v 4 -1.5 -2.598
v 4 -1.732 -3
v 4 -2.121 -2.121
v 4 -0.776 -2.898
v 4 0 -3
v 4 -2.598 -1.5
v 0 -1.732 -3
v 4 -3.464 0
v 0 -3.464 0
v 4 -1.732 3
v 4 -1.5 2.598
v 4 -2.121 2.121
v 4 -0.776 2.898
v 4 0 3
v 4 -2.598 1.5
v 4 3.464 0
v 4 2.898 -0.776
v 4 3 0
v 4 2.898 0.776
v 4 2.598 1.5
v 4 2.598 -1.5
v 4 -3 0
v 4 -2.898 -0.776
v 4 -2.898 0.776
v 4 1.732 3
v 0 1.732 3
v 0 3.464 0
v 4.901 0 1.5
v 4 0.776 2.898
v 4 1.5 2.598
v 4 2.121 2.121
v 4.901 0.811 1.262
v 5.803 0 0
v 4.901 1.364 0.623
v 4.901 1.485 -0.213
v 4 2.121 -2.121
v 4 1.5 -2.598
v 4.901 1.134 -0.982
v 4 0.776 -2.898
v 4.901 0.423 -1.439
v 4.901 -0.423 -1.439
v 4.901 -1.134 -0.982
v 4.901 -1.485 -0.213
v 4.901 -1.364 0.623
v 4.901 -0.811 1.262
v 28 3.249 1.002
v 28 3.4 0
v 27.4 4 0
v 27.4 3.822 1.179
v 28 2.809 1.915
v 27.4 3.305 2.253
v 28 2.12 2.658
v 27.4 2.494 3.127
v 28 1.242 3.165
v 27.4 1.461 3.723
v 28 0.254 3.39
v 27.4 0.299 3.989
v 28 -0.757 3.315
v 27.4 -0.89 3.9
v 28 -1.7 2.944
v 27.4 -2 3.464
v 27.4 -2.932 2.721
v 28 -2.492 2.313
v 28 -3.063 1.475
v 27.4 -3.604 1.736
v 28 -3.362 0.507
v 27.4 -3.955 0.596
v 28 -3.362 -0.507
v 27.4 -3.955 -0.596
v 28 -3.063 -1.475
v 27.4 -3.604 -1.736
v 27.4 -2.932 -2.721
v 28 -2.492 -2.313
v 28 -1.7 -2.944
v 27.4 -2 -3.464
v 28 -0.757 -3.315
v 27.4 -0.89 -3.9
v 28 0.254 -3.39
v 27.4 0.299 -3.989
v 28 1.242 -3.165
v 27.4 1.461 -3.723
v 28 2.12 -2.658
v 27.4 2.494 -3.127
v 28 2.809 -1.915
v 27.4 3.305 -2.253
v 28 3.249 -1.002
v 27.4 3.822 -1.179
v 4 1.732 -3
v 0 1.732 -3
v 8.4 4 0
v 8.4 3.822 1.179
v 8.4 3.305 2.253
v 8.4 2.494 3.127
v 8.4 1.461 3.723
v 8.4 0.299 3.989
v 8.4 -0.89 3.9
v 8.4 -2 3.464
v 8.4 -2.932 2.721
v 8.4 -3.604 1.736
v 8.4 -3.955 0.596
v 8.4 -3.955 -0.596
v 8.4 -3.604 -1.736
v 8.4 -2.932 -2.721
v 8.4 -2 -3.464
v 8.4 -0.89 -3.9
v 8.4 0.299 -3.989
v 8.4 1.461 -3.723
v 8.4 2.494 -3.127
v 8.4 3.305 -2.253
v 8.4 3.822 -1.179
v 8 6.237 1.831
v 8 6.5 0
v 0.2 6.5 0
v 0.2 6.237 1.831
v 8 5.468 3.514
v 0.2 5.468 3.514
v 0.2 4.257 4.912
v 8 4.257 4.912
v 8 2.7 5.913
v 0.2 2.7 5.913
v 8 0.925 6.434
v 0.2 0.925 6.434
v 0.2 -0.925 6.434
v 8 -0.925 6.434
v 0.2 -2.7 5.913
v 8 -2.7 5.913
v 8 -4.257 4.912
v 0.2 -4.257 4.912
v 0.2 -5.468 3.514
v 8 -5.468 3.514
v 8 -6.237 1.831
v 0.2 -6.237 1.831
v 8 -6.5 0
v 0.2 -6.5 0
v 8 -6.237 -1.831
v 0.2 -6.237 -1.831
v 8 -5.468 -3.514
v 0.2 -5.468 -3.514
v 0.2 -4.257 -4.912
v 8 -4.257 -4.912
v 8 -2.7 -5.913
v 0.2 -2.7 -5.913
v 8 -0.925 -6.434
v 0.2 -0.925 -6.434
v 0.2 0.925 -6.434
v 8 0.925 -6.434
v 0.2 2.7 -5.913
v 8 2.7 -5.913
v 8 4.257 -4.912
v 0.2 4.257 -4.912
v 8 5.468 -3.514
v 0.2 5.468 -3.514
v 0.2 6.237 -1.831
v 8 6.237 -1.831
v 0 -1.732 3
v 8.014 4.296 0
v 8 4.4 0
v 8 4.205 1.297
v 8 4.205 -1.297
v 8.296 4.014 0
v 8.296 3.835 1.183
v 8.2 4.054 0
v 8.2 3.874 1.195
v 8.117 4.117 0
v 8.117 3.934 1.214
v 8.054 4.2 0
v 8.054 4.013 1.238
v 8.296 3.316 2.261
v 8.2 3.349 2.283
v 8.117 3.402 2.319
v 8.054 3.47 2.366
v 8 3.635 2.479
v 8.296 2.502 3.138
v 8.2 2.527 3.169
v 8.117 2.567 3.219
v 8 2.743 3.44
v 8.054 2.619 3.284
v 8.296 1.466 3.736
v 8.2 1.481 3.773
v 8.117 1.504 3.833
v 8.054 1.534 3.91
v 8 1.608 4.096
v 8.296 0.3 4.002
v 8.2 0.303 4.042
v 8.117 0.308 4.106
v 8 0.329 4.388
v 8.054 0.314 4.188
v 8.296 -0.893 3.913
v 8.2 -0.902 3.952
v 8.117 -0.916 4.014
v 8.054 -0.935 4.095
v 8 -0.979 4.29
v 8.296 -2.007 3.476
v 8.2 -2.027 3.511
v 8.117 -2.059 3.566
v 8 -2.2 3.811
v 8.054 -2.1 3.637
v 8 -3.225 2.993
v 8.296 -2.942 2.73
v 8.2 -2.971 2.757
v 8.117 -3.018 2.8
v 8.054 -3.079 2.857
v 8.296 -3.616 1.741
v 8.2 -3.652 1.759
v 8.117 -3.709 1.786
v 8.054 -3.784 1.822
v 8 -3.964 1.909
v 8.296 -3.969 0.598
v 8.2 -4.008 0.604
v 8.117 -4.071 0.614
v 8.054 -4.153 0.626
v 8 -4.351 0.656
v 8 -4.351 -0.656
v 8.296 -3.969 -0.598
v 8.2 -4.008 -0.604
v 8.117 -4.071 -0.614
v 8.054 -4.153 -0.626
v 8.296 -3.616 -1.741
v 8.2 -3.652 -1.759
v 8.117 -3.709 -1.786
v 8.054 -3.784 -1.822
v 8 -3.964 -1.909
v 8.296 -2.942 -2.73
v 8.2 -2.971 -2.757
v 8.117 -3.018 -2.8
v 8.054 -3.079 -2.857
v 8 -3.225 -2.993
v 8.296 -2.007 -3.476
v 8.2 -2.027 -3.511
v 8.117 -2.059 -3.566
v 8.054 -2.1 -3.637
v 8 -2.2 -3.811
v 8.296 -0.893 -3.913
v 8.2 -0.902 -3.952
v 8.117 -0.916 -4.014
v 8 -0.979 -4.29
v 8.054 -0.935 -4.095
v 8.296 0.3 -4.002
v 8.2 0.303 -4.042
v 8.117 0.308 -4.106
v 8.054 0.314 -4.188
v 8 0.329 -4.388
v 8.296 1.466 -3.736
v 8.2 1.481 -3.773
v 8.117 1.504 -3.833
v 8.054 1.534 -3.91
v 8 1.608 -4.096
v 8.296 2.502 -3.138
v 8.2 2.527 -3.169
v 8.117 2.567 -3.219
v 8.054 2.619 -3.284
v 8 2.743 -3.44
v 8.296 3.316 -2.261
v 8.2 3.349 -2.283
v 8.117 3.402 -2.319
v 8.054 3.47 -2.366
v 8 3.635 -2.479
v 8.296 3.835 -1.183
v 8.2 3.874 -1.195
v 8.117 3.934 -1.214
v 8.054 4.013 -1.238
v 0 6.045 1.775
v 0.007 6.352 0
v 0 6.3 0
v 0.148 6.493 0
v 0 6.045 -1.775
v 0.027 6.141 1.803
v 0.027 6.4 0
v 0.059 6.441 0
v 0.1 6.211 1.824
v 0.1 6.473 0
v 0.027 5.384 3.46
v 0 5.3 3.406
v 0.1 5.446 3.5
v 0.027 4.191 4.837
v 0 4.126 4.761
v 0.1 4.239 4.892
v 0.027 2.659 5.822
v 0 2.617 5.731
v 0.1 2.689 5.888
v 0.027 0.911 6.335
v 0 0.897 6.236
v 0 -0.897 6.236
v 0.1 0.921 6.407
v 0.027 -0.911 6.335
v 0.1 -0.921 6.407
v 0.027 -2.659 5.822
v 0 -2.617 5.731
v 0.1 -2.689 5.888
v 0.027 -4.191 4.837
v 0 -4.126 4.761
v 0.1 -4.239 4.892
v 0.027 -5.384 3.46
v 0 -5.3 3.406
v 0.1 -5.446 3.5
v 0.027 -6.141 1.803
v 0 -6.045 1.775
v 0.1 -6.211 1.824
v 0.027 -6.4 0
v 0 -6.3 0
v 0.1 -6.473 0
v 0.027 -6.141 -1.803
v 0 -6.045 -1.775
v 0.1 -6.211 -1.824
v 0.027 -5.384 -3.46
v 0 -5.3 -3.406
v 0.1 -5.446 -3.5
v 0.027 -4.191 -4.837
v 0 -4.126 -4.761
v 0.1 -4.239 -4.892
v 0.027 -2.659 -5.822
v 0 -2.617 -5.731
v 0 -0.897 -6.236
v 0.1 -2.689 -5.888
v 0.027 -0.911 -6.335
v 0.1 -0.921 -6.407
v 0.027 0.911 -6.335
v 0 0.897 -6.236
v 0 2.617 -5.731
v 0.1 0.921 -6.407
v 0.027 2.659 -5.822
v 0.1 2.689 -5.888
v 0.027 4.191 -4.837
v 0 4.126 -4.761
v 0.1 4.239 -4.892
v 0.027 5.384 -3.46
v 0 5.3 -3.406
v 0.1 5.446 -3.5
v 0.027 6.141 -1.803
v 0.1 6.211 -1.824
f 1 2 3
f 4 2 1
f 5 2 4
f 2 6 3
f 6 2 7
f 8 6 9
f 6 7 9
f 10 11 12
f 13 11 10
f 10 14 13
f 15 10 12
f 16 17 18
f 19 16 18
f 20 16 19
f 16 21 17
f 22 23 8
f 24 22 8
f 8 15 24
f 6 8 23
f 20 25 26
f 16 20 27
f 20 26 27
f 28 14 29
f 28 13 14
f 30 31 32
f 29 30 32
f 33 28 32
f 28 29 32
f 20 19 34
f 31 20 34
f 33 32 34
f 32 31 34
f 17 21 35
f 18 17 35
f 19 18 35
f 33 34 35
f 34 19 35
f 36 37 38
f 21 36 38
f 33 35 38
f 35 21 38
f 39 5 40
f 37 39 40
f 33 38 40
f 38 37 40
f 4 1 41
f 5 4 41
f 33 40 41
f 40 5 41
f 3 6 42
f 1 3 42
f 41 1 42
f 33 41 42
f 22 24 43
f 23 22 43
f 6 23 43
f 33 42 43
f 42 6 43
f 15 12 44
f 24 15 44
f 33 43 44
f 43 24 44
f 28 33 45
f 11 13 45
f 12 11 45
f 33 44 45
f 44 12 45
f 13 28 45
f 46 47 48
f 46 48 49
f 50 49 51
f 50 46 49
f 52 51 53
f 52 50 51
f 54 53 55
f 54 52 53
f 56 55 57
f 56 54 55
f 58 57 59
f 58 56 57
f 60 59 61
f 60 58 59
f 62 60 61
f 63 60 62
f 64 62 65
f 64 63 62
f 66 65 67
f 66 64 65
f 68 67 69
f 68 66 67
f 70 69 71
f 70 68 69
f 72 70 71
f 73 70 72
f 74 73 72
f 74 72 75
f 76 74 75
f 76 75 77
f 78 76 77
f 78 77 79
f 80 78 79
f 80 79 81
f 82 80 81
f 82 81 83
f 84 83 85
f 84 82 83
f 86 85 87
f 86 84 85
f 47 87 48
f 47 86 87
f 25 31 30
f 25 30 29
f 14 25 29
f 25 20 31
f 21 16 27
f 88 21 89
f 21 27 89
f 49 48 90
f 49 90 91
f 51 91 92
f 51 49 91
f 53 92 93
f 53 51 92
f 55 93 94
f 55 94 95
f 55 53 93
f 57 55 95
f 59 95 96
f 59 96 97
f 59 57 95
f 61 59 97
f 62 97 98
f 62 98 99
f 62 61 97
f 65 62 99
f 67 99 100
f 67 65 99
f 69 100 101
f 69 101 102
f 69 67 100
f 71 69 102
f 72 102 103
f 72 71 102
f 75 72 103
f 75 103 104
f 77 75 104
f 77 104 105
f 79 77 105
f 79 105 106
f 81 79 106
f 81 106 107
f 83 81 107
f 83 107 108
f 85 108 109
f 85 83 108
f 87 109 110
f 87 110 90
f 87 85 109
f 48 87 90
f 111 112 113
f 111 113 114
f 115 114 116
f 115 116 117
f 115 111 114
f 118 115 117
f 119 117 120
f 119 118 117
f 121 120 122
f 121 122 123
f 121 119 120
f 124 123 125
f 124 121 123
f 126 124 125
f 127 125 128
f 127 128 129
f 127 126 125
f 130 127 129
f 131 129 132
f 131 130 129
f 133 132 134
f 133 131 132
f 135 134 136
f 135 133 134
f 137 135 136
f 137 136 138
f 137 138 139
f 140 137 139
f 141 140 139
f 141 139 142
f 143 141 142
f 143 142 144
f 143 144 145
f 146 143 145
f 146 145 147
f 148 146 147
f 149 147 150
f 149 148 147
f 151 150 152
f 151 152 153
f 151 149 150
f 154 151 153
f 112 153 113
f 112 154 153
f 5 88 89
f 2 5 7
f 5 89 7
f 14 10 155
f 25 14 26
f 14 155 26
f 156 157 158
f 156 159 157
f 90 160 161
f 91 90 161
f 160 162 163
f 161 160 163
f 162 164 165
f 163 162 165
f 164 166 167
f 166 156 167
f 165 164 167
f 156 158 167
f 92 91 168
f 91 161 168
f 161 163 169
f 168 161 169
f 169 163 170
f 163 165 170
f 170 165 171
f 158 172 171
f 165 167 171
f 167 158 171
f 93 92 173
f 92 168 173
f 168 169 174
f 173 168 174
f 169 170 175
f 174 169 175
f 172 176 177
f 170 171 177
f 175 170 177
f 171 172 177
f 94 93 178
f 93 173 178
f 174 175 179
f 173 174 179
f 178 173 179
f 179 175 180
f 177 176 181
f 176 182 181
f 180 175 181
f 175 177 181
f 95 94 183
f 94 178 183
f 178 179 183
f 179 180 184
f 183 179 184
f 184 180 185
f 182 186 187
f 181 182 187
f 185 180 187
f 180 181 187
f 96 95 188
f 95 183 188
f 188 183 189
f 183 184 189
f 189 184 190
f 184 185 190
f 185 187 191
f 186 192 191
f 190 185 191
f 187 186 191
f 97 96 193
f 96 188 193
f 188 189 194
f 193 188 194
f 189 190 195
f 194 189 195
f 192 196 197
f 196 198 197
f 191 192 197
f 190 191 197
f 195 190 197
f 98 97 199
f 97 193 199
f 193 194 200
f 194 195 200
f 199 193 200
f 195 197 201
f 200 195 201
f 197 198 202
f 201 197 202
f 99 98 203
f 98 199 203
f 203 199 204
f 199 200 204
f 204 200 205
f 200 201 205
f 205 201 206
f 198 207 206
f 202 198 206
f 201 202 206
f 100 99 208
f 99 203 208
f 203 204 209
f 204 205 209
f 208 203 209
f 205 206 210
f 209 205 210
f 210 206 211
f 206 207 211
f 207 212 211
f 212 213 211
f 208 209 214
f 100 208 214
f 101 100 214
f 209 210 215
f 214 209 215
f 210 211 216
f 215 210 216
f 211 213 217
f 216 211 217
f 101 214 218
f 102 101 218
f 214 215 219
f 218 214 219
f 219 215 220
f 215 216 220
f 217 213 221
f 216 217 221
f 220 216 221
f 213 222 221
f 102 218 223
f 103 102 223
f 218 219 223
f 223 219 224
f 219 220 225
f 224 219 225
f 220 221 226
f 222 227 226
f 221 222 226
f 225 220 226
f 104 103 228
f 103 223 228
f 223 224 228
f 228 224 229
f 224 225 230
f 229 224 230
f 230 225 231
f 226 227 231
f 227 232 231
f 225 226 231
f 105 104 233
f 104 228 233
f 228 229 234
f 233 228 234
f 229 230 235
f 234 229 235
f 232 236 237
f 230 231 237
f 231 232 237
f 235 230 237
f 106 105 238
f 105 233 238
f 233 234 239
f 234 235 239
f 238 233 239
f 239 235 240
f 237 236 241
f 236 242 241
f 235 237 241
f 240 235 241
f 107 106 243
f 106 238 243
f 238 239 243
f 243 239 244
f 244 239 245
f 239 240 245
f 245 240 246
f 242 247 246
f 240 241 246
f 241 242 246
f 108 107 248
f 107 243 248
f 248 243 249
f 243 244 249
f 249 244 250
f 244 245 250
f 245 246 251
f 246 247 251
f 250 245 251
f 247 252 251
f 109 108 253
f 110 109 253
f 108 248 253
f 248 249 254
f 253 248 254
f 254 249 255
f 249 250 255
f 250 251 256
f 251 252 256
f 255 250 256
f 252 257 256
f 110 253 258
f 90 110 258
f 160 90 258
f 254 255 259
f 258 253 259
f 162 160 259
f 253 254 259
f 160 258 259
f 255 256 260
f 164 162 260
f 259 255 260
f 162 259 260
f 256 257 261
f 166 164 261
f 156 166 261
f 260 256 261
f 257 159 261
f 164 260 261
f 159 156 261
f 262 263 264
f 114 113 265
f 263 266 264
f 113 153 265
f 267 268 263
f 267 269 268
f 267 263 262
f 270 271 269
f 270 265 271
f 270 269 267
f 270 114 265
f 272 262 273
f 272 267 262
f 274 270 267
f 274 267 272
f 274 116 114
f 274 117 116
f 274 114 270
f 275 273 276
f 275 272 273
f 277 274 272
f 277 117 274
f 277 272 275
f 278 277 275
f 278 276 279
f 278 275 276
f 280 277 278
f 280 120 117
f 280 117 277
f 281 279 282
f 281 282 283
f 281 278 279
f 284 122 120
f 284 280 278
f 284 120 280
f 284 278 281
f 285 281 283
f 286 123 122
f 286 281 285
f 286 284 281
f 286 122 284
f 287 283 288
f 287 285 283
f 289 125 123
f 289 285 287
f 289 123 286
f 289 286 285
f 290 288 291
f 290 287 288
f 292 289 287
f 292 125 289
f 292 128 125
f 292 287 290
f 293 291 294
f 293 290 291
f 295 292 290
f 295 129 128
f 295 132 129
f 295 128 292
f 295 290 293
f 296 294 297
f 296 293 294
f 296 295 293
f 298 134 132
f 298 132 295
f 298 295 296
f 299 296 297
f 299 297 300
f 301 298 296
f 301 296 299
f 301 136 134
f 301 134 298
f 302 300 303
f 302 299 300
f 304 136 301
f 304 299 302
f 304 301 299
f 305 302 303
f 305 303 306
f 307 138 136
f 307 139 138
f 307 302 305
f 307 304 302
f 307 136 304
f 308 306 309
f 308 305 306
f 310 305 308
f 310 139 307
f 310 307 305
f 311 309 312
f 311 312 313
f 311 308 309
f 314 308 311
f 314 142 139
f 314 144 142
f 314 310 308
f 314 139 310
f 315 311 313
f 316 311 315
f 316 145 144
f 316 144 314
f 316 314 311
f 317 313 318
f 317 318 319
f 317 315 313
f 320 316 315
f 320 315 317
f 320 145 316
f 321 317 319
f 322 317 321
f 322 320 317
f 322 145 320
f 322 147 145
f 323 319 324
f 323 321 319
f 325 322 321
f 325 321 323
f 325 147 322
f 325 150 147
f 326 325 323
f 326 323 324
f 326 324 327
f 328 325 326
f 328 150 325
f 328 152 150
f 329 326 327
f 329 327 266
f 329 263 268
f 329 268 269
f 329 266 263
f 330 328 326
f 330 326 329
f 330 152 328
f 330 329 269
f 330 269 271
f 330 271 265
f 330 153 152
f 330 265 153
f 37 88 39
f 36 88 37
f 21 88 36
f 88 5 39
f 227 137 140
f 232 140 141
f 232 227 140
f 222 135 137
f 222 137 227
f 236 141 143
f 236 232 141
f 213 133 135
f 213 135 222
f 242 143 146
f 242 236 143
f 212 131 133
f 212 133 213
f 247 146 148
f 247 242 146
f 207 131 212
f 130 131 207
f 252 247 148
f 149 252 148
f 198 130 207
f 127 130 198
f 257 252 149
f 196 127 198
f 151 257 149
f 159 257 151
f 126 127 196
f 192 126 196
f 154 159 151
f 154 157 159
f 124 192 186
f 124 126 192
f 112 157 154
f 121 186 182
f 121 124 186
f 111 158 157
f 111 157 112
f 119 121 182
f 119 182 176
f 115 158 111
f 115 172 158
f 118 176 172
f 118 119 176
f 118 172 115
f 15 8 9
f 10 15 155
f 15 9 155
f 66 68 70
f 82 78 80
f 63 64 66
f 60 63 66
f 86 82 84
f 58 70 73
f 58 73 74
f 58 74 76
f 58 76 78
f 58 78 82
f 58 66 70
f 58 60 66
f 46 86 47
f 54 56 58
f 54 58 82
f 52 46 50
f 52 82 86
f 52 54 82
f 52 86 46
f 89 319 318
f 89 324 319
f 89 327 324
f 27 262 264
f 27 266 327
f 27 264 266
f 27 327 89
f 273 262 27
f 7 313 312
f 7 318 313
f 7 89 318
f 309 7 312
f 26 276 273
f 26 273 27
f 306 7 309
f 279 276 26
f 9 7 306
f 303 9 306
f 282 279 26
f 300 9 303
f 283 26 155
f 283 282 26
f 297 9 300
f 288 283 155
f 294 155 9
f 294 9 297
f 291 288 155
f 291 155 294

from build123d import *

# Parameters (mm, degrees)
MM_1_D              = 6
MM_1_DEPTH          = 4
MM_1_TIP            = 1.802581857
CUT_EXTRUDE_1_DEPTH = 4
FILLET_1_R          = 0.2
CHAMFER_1_SIZE      = 0.6
FILLET_2_R          = 0.4


with BuildPart() as part:
    # 草图1 → 旋转1 (revolve)
    with BuildSketch(Plane.XY):
        Polygon((0, 0), (0, 6.5), (8, 6.5), (8, 4), (28, 4), (28, 0), align=None)
    revolve(axis=Axis((0, 0, 0), (1, 0, 0)))

    # 大小mm 暗销孔1
    with Locations(Plane.ZY):
        with Locations((0, 0)):
            Hole(MM_1_D / 2, depth=MM_1_DEPTH)
            with Locations((0, 0, -(MM_1_DEPTH + MM_1_TIP / 2))):  # 118° drill point
                Cone(0, MM_1_D / 2, MM_1_TIP, mode=Mode.SUBTRACT)

    # 草图4 → 切除-拉伸1 (cut)
    with BuildSketch(Plane.ZY):
        Polygon((3, 1.732050808), (0, 3.464101615), (-3, 1.732050808), (-3, -1.732050808), (0, -3.464101615), (3, -1.732050808), align=None)
    extrude(amount=-CUT_EXTRUDE_1_DEPTH, mode=Mode.SUBTRACT)

    # 圆角1
    fillet_1_edges = [part.edges().sort_by_distance(p)[0] for p in [
        (0, -6.5, 0),
    ]]
    fillet(fillet_1_edges, radius=FILLET_1_R)

    # 倒角1
    chamfer_1_edges = [part.edges().sort_by_distance(p)[0] for p in [
        (28, -4, 0),
    ]]
    chamfer(chamfer_1_edges, length=CHAMFER_1_SIZE)

    # 圆角2
    fillet_2_edges = [part.edges().sort_by_distance(p)[0] for p in [
        (8, -4, 0),
    ]]
    fillet(fillet_2_edges, radius=FILLET_2_R)


solid = part.part
